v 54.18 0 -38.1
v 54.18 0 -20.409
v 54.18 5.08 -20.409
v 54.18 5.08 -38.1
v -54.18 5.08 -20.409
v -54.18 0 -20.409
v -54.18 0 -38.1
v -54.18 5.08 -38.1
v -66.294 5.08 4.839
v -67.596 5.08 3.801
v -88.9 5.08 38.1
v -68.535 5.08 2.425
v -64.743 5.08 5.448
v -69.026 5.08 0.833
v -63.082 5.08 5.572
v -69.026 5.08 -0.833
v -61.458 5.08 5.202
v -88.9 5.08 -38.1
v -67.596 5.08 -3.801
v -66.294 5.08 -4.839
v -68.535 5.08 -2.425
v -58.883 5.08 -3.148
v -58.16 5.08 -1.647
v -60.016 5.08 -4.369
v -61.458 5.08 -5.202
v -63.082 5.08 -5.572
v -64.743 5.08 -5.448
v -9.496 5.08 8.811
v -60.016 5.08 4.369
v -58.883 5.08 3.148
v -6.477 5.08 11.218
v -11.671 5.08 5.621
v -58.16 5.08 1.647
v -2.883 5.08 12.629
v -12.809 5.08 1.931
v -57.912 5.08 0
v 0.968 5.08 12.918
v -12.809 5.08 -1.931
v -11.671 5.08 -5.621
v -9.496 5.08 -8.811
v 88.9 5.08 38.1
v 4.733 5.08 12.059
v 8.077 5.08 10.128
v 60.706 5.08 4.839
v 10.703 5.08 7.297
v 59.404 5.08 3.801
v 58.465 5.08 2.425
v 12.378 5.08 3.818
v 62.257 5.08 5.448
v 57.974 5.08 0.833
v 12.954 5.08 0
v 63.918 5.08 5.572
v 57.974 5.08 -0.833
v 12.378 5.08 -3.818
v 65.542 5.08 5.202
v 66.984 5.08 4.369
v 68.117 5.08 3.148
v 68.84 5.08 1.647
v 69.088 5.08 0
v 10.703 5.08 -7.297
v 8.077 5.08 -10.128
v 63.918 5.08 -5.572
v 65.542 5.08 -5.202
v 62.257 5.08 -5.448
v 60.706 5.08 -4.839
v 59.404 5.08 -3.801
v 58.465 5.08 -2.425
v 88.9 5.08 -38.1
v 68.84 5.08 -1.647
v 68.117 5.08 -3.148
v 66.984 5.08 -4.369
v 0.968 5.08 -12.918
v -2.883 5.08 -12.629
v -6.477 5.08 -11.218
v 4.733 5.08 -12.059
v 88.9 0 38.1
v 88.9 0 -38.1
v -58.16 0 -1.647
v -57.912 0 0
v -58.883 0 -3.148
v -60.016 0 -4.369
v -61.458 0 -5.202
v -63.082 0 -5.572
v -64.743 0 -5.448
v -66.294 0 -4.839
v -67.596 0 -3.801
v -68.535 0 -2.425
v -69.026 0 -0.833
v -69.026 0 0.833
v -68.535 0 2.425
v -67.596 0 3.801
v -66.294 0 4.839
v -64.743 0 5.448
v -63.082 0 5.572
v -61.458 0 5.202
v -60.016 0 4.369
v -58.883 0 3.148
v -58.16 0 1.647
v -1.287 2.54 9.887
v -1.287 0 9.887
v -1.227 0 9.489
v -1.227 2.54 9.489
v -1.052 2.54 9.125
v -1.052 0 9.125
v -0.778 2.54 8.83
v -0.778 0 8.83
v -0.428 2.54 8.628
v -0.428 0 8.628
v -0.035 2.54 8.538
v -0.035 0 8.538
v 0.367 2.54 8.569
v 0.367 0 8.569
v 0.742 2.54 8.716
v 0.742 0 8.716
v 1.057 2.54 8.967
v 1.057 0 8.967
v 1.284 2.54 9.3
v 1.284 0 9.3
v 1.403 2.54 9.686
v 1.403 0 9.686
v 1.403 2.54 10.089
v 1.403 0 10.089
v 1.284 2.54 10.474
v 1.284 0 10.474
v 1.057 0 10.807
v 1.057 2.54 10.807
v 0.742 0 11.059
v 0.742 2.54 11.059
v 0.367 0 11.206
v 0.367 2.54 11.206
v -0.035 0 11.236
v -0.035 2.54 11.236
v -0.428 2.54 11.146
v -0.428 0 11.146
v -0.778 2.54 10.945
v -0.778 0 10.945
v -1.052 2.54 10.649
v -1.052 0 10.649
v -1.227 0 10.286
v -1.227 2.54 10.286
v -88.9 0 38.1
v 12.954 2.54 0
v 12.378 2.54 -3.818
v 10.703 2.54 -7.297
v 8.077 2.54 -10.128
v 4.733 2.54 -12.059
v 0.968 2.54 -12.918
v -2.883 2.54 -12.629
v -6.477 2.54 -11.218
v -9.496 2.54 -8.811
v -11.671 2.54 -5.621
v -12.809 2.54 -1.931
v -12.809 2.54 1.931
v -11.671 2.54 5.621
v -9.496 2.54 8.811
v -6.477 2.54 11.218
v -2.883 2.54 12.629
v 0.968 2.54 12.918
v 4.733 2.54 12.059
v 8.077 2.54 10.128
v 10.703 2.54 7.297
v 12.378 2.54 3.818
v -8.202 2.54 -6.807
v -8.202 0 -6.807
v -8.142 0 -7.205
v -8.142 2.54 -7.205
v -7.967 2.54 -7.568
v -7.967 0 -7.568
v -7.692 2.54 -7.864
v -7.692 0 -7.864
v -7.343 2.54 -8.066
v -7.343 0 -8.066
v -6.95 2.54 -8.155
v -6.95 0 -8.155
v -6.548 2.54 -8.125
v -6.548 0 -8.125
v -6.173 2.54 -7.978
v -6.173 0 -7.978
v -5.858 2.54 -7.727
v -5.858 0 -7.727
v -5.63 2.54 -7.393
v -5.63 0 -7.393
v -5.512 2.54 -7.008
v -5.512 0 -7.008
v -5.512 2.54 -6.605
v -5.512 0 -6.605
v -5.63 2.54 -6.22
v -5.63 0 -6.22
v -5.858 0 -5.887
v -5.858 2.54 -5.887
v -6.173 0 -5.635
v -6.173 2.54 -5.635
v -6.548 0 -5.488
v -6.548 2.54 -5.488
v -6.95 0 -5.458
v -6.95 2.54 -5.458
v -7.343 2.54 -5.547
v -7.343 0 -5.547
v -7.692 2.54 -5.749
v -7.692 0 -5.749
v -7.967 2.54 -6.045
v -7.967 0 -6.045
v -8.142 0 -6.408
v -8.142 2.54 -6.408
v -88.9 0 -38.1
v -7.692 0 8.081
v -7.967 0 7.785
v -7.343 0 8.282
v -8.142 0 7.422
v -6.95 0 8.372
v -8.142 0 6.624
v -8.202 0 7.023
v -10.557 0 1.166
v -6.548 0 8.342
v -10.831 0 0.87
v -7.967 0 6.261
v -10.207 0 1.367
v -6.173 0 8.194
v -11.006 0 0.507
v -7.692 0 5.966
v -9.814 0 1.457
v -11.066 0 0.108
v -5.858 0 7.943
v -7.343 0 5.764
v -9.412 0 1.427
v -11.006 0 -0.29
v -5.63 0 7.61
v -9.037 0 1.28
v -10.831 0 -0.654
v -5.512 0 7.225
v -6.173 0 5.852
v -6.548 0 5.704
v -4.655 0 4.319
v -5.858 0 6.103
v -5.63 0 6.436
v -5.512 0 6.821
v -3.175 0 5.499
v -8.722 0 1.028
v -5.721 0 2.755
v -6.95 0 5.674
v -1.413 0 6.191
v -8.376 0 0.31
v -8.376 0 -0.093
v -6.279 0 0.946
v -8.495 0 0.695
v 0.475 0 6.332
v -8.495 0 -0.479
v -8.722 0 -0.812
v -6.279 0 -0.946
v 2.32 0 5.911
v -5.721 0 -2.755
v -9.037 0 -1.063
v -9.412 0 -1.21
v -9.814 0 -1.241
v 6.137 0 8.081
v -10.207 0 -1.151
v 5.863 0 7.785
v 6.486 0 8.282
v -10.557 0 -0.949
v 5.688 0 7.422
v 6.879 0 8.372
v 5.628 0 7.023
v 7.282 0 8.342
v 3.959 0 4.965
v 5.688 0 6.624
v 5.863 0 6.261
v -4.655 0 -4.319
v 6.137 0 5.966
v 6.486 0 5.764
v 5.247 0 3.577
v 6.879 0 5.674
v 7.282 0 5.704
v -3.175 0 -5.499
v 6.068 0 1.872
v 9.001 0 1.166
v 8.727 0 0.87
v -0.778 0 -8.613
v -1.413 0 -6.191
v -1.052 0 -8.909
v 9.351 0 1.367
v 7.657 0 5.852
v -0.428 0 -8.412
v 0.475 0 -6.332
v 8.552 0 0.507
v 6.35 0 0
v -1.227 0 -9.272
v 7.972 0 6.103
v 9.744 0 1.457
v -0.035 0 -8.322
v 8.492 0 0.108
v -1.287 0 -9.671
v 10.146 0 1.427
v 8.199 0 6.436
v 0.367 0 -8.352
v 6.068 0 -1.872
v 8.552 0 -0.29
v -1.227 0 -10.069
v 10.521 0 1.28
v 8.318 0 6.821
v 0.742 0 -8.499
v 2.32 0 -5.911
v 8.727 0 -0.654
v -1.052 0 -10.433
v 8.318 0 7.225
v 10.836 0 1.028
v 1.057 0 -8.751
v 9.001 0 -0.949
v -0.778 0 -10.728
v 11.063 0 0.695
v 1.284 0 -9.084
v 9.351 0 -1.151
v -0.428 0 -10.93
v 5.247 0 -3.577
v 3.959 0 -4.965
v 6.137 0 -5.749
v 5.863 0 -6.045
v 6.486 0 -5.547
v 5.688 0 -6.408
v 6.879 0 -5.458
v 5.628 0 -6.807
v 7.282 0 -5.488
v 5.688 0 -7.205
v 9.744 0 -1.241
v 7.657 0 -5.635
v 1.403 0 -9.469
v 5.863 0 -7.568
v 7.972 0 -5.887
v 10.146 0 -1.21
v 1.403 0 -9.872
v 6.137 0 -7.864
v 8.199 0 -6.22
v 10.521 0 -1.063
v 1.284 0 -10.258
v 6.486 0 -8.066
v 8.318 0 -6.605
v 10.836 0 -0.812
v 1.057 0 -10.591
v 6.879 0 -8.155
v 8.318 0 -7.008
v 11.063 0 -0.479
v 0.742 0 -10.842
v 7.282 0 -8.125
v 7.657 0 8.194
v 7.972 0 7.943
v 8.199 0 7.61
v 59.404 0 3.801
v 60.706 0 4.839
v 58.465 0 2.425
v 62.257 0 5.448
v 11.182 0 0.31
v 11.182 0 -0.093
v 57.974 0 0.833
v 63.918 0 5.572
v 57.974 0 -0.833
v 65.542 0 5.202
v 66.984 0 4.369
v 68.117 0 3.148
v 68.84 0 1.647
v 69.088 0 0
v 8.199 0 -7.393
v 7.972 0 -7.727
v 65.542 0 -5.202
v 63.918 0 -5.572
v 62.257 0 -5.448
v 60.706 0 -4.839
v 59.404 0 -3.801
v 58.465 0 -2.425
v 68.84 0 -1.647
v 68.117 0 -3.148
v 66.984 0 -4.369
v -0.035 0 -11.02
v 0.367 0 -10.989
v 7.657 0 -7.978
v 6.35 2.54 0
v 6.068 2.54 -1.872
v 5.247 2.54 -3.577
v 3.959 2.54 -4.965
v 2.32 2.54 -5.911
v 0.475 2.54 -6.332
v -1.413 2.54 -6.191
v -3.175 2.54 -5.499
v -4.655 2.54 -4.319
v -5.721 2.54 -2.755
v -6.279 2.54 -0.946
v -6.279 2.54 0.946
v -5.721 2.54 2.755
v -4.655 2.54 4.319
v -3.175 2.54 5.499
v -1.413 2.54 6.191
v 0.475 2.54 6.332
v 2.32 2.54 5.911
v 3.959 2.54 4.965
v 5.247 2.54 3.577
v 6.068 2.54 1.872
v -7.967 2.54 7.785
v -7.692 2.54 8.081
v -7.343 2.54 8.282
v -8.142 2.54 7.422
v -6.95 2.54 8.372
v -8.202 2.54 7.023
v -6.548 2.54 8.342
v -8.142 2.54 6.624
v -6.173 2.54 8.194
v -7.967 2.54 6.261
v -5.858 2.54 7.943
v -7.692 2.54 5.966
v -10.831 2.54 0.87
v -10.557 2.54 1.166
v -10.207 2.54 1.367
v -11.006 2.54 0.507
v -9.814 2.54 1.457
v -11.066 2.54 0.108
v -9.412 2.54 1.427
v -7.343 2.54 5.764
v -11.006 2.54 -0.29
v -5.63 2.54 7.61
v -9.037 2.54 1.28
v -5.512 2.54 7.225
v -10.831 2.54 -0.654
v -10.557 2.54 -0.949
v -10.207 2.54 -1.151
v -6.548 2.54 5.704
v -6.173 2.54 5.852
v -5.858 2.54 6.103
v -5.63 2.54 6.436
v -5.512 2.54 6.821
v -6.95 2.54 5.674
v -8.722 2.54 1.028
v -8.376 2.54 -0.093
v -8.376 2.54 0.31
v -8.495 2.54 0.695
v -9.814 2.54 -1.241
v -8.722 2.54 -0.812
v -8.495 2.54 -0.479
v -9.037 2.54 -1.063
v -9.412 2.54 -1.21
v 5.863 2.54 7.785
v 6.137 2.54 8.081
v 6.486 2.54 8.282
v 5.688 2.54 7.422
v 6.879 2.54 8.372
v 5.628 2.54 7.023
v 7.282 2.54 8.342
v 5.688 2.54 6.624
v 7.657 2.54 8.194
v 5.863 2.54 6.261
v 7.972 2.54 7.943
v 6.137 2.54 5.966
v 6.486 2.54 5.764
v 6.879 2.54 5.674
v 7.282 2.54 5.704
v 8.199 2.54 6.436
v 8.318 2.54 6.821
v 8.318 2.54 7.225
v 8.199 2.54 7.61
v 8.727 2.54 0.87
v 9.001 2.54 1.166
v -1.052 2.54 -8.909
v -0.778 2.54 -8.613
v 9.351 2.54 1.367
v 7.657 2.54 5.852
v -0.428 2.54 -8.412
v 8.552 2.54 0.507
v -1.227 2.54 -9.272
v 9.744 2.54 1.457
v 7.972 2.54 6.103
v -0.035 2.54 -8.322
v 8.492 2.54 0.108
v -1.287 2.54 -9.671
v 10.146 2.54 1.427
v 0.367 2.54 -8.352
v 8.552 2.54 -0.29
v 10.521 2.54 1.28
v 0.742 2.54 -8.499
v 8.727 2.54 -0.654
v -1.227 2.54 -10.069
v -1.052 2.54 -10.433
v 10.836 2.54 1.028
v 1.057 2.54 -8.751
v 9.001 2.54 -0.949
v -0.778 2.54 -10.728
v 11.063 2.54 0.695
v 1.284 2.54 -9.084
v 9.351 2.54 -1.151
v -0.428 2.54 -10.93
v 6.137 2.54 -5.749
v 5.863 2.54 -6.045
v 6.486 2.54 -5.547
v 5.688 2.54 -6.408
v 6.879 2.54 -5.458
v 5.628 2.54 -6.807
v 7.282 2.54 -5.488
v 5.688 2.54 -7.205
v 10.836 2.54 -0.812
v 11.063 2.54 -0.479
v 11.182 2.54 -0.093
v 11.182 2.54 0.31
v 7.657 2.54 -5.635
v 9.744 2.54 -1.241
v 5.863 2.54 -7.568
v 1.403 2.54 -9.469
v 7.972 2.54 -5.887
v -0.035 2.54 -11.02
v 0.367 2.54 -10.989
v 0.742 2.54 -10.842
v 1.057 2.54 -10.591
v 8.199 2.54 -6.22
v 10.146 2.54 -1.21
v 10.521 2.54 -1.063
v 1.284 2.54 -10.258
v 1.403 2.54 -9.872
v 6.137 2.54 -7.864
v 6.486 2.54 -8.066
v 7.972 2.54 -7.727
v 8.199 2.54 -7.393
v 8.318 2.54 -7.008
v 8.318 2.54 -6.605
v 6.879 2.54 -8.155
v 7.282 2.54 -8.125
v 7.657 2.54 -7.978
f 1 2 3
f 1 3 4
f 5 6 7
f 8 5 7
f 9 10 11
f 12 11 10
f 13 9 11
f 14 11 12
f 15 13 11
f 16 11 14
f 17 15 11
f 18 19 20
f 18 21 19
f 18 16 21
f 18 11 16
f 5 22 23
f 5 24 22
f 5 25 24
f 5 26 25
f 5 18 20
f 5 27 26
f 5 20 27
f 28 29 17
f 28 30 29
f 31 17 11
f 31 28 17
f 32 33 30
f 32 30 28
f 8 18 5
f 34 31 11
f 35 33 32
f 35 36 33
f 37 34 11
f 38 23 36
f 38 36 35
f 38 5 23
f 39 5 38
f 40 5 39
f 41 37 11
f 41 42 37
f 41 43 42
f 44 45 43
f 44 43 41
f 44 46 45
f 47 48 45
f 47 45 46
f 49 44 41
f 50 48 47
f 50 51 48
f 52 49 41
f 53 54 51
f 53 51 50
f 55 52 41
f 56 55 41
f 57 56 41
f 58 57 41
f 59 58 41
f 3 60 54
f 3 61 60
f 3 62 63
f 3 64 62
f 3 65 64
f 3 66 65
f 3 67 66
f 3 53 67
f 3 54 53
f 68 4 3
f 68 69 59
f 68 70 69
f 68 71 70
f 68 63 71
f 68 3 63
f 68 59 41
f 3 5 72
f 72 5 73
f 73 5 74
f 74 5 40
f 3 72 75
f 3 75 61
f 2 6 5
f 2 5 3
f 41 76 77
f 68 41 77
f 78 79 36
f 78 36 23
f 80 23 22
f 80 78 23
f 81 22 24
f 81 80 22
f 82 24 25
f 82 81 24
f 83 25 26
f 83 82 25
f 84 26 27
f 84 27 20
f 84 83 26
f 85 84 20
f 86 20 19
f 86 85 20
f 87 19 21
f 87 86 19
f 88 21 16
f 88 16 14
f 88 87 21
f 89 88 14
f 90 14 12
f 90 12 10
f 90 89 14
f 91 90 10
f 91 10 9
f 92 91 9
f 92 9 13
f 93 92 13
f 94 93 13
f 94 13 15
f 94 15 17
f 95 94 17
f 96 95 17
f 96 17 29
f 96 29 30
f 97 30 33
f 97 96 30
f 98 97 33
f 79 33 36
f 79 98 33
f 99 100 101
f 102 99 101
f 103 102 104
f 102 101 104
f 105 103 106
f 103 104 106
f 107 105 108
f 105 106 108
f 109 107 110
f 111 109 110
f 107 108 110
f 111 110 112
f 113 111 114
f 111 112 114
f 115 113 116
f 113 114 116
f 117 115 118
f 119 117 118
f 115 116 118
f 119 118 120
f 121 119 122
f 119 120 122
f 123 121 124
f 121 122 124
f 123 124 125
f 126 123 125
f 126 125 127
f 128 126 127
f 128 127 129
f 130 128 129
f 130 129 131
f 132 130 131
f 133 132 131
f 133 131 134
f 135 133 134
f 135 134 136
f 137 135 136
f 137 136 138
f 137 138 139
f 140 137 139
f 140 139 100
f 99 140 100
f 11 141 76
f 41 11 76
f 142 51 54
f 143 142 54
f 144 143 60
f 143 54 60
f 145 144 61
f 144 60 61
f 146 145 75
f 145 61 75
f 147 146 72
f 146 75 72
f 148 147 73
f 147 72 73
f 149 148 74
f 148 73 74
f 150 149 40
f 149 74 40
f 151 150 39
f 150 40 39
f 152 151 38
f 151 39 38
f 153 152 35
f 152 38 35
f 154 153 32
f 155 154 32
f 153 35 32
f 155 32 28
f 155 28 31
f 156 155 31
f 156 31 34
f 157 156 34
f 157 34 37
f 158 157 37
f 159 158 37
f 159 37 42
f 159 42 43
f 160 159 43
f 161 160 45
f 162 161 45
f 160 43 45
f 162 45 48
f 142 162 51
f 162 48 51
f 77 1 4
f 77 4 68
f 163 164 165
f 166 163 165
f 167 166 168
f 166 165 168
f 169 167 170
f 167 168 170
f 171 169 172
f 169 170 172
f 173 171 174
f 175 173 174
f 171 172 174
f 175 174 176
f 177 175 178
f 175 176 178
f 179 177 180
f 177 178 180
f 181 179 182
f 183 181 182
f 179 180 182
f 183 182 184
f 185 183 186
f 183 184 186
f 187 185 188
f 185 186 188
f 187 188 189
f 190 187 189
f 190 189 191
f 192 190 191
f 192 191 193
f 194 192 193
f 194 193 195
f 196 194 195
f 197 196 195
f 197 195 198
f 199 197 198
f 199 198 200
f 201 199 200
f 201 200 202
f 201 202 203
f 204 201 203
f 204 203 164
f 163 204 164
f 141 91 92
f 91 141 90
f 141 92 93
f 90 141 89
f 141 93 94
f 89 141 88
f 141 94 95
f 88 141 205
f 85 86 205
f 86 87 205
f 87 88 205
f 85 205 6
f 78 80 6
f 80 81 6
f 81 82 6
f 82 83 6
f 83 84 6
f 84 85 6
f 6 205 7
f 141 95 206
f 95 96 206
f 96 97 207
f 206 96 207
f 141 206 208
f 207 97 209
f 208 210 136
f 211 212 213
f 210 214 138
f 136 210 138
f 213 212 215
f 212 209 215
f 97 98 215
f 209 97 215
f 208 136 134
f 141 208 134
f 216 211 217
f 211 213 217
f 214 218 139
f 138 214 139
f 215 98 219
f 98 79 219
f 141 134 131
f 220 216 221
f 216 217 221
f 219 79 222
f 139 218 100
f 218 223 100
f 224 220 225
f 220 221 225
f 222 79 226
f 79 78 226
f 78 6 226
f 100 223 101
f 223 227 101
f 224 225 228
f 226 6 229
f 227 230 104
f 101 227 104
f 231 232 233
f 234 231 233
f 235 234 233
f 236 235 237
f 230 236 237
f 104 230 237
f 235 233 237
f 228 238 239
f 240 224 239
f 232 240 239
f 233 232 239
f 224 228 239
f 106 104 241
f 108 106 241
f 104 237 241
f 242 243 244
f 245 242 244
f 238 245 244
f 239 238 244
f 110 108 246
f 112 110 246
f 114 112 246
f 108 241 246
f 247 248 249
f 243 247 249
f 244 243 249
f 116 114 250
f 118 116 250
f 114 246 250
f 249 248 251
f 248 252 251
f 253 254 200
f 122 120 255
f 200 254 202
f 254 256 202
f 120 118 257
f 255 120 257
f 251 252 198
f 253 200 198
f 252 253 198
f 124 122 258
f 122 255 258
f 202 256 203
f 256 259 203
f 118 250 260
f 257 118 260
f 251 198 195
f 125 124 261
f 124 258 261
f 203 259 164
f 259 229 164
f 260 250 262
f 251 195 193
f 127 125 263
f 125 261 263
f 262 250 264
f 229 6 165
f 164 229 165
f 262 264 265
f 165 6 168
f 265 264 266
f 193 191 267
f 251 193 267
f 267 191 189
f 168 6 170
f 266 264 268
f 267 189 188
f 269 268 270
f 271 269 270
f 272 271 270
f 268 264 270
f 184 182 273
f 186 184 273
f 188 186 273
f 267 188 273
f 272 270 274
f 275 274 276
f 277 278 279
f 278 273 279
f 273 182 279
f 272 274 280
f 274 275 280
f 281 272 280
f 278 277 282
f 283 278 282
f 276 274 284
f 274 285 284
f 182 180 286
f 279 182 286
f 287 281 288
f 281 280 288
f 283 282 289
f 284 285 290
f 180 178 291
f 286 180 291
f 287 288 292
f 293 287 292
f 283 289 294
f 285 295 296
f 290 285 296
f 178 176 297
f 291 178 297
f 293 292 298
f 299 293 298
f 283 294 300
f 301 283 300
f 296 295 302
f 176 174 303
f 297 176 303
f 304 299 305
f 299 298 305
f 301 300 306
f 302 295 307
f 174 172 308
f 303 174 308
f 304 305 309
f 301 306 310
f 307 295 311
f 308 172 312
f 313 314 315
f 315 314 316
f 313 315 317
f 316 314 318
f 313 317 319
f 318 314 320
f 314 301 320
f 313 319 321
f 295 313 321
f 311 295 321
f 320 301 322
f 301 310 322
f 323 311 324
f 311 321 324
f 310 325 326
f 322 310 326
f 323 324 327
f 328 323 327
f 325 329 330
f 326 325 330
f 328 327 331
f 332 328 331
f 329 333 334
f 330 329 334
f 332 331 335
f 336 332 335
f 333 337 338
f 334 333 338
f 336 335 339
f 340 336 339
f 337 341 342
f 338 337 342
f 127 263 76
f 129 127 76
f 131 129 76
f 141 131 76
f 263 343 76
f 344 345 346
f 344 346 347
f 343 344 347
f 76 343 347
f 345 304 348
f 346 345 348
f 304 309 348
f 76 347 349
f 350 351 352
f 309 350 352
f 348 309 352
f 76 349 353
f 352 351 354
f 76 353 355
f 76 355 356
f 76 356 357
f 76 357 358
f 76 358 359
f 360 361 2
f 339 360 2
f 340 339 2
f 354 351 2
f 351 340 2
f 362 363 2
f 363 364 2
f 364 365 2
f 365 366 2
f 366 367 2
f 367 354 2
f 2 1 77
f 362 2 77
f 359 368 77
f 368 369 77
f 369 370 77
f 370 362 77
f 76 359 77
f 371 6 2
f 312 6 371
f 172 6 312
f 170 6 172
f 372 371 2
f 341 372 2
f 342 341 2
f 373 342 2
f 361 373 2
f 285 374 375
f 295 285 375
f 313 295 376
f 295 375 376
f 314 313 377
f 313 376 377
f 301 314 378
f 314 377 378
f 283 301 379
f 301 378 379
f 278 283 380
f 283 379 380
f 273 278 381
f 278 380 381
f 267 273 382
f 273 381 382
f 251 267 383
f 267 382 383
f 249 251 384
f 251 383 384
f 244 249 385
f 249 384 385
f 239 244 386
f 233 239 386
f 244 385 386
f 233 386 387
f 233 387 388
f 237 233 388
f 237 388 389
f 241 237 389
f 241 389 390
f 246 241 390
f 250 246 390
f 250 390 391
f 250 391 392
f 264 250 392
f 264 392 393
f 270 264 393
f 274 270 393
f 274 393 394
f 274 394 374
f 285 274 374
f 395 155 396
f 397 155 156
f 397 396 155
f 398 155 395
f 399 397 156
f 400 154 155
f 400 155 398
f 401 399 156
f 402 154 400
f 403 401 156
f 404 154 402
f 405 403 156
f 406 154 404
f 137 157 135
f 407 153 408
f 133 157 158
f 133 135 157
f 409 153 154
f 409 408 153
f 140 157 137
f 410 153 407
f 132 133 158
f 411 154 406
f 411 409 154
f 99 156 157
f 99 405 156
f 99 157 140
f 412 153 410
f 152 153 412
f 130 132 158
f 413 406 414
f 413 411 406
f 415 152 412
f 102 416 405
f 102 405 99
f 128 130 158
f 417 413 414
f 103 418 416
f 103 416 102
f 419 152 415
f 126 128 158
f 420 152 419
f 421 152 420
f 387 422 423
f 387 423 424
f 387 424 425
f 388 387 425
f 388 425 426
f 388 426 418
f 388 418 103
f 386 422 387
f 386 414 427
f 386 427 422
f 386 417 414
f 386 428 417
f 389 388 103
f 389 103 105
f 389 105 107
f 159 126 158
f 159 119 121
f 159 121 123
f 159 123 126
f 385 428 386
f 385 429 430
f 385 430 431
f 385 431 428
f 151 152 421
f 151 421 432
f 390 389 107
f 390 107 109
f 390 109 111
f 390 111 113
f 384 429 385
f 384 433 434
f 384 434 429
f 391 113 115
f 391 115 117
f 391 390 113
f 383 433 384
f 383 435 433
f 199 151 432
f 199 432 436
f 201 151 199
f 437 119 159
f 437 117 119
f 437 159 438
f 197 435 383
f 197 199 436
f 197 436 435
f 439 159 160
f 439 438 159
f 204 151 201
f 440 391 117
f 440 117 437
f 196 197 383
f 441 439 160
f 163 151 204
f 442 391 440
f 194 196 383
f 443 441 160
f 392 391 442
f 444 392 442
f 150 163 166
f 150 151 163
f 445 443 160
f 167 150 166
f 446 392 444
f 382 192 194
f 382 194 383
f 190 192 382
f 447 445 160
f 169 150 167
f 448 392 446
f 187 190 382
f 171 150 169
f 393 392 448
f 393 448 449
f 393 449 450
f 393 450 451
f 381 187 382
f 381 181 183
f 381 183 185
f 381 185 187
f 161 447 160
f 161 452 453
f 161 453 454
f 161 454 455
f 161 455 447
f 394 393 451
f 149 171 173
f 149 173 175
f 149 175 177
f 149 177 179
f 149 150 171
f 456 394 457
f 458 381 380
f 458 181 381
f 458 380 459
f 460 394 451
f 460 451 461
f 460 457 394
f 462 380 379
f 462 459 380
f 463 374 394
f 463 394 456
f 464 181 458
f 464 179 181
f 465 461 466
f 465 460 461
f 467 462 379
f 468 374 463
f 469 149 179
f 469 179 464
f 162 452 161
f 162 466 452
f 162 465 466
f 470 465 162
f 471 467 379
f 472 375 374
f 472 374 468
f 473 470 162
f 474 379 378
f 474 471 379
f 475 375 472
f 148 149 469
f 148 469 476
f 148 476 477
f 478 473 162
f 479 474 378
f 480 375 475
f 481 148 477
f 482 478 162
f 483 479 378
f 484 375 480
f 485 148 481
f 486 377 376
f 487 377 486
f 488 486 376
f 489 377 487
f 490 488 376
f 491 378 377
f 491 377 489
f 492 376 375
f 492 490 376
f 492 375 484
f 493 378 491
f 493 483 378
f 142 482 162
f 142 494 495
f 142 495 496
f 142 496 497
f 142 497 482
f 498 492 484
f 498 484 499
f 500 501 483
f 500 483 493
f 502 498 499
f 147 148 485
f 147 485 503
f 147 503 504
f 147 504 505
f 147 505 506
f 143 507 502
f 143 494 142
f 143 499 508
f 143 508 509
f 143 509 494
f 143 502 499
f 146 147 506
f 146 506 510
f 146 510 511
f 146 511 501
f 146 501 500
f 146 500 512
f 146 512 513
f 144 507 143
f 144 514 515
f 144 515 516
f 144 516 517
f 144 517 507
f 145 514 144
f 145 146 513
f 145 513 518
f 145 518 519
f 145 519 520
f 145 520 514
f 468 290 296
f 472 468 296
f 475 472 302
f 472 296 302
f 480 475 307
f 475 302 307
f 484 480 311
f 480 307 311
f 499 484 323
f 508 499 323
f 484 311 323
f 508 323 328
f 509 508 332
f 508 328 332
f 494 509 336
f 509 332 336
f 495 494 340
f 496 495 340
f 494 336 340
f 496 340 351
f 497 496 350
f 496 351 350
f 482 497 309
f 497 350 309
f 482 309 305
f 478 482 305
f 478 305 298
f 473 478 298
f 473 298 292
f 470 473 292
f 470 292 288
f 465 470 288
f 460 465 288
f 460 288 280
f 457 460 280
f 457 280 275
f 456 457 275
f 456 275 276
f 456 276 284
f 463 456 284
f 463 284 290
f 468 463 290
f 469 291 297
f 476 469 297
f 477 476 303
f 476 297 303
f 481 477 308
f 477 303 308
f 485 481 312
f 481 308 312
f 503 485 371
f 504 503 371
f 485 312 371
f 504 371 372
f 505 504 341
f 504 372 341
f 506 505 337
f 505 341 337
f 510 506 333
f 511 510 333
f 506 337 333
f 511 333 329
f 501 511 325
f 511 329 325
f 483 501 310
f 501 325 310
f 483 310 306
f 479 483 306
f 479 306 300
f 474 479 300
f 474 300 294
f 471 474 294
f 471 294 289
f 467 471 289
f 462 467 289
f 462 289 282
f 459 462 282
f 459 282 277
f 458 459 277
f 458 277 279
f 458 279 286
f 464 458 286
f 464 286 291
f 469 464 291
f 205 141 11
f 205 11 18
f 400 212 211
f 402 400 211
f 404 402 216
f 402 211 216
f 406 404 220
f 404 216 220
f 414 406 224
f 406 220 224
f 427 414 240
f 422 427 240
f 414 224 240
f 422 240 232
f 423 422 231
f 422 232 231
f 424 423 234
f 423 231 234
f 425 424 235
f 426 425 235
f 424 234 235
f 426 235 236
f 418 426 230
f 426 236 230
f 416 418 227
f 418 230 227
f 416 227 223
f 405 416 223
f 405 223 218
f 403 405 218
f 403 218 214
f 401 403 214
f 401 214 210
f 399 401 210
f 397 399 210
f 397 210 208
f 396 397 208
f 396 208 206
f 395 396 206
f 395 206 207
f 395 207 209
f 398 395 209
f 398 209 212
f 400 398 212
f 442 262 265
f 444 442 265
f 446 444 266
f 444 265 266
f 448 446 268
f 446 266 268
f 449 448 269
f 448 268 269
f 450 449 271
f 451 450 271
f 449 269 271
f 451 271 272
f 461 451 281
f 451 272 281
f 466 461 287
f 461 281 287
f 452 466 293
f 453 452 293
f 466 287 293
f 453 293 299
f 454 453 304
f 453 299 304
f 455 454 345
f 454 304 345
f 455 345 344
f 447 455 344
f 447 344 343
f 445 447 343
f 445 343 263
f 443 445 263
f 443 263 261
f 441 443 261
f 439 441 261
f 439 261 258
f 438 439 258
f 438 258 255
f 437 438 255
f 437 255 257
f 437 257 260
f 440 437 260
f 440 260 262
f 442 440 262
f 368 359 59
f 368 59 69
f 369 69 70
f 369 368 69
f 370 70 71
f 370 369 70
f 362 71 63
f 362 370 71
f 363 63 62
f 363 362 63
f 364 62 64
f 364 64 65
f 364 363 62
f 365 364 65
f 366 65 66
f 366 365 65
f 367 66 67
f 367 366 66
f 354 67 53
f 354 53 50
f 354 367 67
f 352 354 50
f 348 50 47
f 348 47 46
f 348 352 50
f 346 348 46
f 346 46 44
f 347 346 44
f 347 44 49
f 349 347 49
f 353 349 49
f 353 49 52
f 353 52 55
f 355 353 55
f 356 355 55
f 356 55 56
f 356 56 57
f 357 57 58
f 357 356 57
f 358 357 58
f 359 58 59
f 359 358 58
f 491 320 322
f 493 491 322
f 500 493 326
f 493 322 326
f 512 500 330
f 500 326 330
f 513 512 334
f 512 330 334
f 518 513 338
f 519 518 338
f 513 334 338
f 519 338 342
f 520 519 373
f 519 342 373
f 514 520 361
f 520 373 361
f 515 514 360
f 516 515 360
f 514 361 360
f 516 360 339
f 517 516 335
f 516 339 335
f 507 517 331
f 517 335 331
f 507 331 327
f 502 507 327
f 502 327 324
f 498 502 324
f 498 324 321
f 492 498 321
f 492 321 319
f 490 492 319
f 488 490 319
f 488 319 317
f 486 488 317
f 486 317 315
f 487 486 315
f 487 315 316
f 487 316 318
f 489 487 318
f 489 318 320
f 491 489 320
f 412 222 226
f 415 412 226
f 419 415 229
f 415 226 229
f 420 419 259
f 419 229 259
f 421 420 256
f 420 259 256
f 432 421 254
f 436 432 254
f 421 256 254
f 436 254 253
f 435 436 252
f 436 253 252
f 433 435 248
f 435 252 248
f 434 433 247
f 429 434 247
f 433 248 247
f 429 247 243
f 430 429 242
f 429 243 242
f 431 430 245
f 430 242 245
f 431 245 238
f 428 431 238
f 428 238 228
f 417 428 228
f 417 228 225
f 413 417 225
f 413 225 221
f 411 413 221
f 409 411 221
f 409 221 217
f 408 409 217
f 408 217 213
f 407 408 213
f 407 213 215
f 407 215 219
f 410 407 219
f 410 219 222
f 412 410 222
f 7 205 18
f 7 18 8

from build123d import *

# Parameters (mm, degrees)
SKETCH1_W             = 177.8
SKETCH1_H             = 76.2
SKETCH1_R             = 5.588
BOSS_EXTRUDE1_DEPTH   = 5.08
SKETCH2_R             = 12.954
SKETCH2_R_2           = 0.712100007
CUT_EXTRUDE1_DEPTH    = 2.54
SKETCH4_R             = 6.35
CUT_EXTRUDE2_DEPTH    = 6.08
F_6_32_TAPPED_HOLE2_D = 2.7051
SKETCH9_W             = 108.359679772
SKETCH9_H             = 17.691365346
CUT_EXTRUDE7_DEPTH    = 5.08


with BuildPart() as part:
    # Sketch1 → Boss-Extrude1 (new body)
    with BuildSketch(Plane(origin=(0, 0, 0), x_dir=(1, 0, 0), z_dir=(0, 1, 0))):
        Rectangle(SKETCH1_W, SKETCH1_H)
        with Locations((-63.5, 0)):
            Circle(SKETCH1_R, mode=Mode.SUBTRACT)
        with Locations((63.5, 0)):
            Circle(SKETCH1_R, mode=Mode.SUBTRACT)
    extrude(amount=BOSS_EXTRUDE1_DEPTH)

    # Sketch2 → Cut-Extrude1 (cut)
    with BuildSketch(Plane(origin=(0, 5.08, 0), x_dir=(1, 0, 0), z_dir=(0, 1, 0))):
        Circle(SKETCH2_R)
        with Locations((6.980537549, -7.023044726)):
            Circle(SKETCH2_R_2, mode=Mode.SUBTRACT)
        with Locations((9.844740335, -0.108247513)):
            Circle(SKETCH2_R_2, mode=Mode.SUBTRACT)
        with Locations((-6.849056878, -7.023044726)):
            Circle(SKETCH2_R_2, mode=Mode.SUBTRACT)
        with Locations((0.065740335, -9.887247513)):
            Circle(SKETCH2_R_2, mode=Mode.SUBTRACT)
        with Locations((6.980537549, 6.8065497)):
            Circle(SKETCH2_R_2, mode=Mode.SUBTRACT)
        with Locations((0.065740335, 9.670752487)):
            Circle(SKETCH2_R_2, mode=Mode.SUBTRACT)
        with Locations((-6.849056878, 6.8065497)):
            Circle(SKETCH2_R_2, mode=Mode.SUBTRACT)
        with Locations((-9.713259665, -0.108247513)):
            Circle(SKETCH2_R_2, mode=Mode.SUBTRACT)
    extrude(amount=-CUT_EXTRUDE1_DEPTH, mode=Mode.SUBTRACT)

    # Sketch4 → Cut-Extrude2 (cut, through all)
    with BuildSketch(Plane(origin=(0, 5.08, 0), x_dir=(1, 0, 0), z_dir=(0, 1, 0))):
        Circle(SKETCH4_R)
    extrude(amount=-CUT_EXTRUDE2_DEPTH, mode=Mode.SUBTRACT)

    # #6-32 Tapped Hole2 (through all)
    with Locations(Plane(origin=(0, 2.54, 0), x_dir=(1, 0, 0), z_dir=(0, 1, 0))):
        with Locations((6.980537549, 6.8065497), (9.844740335, -0.108247513), (6.980537549, -7.023044726), (0.065740335, 9.670752487), (-6.849056878, 6.8065497), (-9.713259665, -0.108247513), (-6.849056878, -7.023044726), (0.065740335, -9.887247513)):
            Hole(F_6_32_TAPPED_HOLE2_D / 2)

    # Sketch9 → Cut-Extrude7 (cut)
    with BuildSketch(Plane(origin=(0, 0, 0), x_dir=(1, 0, 0), z_dir=(0, 1, 0))):
        with Locations((0, 29.254317327)):
            Rectangle(SKETCH9_W, SKETCH9_H)
    extrude(amount=CUT_EXTRUDE7_DEPTH, mode=Mode.SUBTRACT)


solid = part.part
